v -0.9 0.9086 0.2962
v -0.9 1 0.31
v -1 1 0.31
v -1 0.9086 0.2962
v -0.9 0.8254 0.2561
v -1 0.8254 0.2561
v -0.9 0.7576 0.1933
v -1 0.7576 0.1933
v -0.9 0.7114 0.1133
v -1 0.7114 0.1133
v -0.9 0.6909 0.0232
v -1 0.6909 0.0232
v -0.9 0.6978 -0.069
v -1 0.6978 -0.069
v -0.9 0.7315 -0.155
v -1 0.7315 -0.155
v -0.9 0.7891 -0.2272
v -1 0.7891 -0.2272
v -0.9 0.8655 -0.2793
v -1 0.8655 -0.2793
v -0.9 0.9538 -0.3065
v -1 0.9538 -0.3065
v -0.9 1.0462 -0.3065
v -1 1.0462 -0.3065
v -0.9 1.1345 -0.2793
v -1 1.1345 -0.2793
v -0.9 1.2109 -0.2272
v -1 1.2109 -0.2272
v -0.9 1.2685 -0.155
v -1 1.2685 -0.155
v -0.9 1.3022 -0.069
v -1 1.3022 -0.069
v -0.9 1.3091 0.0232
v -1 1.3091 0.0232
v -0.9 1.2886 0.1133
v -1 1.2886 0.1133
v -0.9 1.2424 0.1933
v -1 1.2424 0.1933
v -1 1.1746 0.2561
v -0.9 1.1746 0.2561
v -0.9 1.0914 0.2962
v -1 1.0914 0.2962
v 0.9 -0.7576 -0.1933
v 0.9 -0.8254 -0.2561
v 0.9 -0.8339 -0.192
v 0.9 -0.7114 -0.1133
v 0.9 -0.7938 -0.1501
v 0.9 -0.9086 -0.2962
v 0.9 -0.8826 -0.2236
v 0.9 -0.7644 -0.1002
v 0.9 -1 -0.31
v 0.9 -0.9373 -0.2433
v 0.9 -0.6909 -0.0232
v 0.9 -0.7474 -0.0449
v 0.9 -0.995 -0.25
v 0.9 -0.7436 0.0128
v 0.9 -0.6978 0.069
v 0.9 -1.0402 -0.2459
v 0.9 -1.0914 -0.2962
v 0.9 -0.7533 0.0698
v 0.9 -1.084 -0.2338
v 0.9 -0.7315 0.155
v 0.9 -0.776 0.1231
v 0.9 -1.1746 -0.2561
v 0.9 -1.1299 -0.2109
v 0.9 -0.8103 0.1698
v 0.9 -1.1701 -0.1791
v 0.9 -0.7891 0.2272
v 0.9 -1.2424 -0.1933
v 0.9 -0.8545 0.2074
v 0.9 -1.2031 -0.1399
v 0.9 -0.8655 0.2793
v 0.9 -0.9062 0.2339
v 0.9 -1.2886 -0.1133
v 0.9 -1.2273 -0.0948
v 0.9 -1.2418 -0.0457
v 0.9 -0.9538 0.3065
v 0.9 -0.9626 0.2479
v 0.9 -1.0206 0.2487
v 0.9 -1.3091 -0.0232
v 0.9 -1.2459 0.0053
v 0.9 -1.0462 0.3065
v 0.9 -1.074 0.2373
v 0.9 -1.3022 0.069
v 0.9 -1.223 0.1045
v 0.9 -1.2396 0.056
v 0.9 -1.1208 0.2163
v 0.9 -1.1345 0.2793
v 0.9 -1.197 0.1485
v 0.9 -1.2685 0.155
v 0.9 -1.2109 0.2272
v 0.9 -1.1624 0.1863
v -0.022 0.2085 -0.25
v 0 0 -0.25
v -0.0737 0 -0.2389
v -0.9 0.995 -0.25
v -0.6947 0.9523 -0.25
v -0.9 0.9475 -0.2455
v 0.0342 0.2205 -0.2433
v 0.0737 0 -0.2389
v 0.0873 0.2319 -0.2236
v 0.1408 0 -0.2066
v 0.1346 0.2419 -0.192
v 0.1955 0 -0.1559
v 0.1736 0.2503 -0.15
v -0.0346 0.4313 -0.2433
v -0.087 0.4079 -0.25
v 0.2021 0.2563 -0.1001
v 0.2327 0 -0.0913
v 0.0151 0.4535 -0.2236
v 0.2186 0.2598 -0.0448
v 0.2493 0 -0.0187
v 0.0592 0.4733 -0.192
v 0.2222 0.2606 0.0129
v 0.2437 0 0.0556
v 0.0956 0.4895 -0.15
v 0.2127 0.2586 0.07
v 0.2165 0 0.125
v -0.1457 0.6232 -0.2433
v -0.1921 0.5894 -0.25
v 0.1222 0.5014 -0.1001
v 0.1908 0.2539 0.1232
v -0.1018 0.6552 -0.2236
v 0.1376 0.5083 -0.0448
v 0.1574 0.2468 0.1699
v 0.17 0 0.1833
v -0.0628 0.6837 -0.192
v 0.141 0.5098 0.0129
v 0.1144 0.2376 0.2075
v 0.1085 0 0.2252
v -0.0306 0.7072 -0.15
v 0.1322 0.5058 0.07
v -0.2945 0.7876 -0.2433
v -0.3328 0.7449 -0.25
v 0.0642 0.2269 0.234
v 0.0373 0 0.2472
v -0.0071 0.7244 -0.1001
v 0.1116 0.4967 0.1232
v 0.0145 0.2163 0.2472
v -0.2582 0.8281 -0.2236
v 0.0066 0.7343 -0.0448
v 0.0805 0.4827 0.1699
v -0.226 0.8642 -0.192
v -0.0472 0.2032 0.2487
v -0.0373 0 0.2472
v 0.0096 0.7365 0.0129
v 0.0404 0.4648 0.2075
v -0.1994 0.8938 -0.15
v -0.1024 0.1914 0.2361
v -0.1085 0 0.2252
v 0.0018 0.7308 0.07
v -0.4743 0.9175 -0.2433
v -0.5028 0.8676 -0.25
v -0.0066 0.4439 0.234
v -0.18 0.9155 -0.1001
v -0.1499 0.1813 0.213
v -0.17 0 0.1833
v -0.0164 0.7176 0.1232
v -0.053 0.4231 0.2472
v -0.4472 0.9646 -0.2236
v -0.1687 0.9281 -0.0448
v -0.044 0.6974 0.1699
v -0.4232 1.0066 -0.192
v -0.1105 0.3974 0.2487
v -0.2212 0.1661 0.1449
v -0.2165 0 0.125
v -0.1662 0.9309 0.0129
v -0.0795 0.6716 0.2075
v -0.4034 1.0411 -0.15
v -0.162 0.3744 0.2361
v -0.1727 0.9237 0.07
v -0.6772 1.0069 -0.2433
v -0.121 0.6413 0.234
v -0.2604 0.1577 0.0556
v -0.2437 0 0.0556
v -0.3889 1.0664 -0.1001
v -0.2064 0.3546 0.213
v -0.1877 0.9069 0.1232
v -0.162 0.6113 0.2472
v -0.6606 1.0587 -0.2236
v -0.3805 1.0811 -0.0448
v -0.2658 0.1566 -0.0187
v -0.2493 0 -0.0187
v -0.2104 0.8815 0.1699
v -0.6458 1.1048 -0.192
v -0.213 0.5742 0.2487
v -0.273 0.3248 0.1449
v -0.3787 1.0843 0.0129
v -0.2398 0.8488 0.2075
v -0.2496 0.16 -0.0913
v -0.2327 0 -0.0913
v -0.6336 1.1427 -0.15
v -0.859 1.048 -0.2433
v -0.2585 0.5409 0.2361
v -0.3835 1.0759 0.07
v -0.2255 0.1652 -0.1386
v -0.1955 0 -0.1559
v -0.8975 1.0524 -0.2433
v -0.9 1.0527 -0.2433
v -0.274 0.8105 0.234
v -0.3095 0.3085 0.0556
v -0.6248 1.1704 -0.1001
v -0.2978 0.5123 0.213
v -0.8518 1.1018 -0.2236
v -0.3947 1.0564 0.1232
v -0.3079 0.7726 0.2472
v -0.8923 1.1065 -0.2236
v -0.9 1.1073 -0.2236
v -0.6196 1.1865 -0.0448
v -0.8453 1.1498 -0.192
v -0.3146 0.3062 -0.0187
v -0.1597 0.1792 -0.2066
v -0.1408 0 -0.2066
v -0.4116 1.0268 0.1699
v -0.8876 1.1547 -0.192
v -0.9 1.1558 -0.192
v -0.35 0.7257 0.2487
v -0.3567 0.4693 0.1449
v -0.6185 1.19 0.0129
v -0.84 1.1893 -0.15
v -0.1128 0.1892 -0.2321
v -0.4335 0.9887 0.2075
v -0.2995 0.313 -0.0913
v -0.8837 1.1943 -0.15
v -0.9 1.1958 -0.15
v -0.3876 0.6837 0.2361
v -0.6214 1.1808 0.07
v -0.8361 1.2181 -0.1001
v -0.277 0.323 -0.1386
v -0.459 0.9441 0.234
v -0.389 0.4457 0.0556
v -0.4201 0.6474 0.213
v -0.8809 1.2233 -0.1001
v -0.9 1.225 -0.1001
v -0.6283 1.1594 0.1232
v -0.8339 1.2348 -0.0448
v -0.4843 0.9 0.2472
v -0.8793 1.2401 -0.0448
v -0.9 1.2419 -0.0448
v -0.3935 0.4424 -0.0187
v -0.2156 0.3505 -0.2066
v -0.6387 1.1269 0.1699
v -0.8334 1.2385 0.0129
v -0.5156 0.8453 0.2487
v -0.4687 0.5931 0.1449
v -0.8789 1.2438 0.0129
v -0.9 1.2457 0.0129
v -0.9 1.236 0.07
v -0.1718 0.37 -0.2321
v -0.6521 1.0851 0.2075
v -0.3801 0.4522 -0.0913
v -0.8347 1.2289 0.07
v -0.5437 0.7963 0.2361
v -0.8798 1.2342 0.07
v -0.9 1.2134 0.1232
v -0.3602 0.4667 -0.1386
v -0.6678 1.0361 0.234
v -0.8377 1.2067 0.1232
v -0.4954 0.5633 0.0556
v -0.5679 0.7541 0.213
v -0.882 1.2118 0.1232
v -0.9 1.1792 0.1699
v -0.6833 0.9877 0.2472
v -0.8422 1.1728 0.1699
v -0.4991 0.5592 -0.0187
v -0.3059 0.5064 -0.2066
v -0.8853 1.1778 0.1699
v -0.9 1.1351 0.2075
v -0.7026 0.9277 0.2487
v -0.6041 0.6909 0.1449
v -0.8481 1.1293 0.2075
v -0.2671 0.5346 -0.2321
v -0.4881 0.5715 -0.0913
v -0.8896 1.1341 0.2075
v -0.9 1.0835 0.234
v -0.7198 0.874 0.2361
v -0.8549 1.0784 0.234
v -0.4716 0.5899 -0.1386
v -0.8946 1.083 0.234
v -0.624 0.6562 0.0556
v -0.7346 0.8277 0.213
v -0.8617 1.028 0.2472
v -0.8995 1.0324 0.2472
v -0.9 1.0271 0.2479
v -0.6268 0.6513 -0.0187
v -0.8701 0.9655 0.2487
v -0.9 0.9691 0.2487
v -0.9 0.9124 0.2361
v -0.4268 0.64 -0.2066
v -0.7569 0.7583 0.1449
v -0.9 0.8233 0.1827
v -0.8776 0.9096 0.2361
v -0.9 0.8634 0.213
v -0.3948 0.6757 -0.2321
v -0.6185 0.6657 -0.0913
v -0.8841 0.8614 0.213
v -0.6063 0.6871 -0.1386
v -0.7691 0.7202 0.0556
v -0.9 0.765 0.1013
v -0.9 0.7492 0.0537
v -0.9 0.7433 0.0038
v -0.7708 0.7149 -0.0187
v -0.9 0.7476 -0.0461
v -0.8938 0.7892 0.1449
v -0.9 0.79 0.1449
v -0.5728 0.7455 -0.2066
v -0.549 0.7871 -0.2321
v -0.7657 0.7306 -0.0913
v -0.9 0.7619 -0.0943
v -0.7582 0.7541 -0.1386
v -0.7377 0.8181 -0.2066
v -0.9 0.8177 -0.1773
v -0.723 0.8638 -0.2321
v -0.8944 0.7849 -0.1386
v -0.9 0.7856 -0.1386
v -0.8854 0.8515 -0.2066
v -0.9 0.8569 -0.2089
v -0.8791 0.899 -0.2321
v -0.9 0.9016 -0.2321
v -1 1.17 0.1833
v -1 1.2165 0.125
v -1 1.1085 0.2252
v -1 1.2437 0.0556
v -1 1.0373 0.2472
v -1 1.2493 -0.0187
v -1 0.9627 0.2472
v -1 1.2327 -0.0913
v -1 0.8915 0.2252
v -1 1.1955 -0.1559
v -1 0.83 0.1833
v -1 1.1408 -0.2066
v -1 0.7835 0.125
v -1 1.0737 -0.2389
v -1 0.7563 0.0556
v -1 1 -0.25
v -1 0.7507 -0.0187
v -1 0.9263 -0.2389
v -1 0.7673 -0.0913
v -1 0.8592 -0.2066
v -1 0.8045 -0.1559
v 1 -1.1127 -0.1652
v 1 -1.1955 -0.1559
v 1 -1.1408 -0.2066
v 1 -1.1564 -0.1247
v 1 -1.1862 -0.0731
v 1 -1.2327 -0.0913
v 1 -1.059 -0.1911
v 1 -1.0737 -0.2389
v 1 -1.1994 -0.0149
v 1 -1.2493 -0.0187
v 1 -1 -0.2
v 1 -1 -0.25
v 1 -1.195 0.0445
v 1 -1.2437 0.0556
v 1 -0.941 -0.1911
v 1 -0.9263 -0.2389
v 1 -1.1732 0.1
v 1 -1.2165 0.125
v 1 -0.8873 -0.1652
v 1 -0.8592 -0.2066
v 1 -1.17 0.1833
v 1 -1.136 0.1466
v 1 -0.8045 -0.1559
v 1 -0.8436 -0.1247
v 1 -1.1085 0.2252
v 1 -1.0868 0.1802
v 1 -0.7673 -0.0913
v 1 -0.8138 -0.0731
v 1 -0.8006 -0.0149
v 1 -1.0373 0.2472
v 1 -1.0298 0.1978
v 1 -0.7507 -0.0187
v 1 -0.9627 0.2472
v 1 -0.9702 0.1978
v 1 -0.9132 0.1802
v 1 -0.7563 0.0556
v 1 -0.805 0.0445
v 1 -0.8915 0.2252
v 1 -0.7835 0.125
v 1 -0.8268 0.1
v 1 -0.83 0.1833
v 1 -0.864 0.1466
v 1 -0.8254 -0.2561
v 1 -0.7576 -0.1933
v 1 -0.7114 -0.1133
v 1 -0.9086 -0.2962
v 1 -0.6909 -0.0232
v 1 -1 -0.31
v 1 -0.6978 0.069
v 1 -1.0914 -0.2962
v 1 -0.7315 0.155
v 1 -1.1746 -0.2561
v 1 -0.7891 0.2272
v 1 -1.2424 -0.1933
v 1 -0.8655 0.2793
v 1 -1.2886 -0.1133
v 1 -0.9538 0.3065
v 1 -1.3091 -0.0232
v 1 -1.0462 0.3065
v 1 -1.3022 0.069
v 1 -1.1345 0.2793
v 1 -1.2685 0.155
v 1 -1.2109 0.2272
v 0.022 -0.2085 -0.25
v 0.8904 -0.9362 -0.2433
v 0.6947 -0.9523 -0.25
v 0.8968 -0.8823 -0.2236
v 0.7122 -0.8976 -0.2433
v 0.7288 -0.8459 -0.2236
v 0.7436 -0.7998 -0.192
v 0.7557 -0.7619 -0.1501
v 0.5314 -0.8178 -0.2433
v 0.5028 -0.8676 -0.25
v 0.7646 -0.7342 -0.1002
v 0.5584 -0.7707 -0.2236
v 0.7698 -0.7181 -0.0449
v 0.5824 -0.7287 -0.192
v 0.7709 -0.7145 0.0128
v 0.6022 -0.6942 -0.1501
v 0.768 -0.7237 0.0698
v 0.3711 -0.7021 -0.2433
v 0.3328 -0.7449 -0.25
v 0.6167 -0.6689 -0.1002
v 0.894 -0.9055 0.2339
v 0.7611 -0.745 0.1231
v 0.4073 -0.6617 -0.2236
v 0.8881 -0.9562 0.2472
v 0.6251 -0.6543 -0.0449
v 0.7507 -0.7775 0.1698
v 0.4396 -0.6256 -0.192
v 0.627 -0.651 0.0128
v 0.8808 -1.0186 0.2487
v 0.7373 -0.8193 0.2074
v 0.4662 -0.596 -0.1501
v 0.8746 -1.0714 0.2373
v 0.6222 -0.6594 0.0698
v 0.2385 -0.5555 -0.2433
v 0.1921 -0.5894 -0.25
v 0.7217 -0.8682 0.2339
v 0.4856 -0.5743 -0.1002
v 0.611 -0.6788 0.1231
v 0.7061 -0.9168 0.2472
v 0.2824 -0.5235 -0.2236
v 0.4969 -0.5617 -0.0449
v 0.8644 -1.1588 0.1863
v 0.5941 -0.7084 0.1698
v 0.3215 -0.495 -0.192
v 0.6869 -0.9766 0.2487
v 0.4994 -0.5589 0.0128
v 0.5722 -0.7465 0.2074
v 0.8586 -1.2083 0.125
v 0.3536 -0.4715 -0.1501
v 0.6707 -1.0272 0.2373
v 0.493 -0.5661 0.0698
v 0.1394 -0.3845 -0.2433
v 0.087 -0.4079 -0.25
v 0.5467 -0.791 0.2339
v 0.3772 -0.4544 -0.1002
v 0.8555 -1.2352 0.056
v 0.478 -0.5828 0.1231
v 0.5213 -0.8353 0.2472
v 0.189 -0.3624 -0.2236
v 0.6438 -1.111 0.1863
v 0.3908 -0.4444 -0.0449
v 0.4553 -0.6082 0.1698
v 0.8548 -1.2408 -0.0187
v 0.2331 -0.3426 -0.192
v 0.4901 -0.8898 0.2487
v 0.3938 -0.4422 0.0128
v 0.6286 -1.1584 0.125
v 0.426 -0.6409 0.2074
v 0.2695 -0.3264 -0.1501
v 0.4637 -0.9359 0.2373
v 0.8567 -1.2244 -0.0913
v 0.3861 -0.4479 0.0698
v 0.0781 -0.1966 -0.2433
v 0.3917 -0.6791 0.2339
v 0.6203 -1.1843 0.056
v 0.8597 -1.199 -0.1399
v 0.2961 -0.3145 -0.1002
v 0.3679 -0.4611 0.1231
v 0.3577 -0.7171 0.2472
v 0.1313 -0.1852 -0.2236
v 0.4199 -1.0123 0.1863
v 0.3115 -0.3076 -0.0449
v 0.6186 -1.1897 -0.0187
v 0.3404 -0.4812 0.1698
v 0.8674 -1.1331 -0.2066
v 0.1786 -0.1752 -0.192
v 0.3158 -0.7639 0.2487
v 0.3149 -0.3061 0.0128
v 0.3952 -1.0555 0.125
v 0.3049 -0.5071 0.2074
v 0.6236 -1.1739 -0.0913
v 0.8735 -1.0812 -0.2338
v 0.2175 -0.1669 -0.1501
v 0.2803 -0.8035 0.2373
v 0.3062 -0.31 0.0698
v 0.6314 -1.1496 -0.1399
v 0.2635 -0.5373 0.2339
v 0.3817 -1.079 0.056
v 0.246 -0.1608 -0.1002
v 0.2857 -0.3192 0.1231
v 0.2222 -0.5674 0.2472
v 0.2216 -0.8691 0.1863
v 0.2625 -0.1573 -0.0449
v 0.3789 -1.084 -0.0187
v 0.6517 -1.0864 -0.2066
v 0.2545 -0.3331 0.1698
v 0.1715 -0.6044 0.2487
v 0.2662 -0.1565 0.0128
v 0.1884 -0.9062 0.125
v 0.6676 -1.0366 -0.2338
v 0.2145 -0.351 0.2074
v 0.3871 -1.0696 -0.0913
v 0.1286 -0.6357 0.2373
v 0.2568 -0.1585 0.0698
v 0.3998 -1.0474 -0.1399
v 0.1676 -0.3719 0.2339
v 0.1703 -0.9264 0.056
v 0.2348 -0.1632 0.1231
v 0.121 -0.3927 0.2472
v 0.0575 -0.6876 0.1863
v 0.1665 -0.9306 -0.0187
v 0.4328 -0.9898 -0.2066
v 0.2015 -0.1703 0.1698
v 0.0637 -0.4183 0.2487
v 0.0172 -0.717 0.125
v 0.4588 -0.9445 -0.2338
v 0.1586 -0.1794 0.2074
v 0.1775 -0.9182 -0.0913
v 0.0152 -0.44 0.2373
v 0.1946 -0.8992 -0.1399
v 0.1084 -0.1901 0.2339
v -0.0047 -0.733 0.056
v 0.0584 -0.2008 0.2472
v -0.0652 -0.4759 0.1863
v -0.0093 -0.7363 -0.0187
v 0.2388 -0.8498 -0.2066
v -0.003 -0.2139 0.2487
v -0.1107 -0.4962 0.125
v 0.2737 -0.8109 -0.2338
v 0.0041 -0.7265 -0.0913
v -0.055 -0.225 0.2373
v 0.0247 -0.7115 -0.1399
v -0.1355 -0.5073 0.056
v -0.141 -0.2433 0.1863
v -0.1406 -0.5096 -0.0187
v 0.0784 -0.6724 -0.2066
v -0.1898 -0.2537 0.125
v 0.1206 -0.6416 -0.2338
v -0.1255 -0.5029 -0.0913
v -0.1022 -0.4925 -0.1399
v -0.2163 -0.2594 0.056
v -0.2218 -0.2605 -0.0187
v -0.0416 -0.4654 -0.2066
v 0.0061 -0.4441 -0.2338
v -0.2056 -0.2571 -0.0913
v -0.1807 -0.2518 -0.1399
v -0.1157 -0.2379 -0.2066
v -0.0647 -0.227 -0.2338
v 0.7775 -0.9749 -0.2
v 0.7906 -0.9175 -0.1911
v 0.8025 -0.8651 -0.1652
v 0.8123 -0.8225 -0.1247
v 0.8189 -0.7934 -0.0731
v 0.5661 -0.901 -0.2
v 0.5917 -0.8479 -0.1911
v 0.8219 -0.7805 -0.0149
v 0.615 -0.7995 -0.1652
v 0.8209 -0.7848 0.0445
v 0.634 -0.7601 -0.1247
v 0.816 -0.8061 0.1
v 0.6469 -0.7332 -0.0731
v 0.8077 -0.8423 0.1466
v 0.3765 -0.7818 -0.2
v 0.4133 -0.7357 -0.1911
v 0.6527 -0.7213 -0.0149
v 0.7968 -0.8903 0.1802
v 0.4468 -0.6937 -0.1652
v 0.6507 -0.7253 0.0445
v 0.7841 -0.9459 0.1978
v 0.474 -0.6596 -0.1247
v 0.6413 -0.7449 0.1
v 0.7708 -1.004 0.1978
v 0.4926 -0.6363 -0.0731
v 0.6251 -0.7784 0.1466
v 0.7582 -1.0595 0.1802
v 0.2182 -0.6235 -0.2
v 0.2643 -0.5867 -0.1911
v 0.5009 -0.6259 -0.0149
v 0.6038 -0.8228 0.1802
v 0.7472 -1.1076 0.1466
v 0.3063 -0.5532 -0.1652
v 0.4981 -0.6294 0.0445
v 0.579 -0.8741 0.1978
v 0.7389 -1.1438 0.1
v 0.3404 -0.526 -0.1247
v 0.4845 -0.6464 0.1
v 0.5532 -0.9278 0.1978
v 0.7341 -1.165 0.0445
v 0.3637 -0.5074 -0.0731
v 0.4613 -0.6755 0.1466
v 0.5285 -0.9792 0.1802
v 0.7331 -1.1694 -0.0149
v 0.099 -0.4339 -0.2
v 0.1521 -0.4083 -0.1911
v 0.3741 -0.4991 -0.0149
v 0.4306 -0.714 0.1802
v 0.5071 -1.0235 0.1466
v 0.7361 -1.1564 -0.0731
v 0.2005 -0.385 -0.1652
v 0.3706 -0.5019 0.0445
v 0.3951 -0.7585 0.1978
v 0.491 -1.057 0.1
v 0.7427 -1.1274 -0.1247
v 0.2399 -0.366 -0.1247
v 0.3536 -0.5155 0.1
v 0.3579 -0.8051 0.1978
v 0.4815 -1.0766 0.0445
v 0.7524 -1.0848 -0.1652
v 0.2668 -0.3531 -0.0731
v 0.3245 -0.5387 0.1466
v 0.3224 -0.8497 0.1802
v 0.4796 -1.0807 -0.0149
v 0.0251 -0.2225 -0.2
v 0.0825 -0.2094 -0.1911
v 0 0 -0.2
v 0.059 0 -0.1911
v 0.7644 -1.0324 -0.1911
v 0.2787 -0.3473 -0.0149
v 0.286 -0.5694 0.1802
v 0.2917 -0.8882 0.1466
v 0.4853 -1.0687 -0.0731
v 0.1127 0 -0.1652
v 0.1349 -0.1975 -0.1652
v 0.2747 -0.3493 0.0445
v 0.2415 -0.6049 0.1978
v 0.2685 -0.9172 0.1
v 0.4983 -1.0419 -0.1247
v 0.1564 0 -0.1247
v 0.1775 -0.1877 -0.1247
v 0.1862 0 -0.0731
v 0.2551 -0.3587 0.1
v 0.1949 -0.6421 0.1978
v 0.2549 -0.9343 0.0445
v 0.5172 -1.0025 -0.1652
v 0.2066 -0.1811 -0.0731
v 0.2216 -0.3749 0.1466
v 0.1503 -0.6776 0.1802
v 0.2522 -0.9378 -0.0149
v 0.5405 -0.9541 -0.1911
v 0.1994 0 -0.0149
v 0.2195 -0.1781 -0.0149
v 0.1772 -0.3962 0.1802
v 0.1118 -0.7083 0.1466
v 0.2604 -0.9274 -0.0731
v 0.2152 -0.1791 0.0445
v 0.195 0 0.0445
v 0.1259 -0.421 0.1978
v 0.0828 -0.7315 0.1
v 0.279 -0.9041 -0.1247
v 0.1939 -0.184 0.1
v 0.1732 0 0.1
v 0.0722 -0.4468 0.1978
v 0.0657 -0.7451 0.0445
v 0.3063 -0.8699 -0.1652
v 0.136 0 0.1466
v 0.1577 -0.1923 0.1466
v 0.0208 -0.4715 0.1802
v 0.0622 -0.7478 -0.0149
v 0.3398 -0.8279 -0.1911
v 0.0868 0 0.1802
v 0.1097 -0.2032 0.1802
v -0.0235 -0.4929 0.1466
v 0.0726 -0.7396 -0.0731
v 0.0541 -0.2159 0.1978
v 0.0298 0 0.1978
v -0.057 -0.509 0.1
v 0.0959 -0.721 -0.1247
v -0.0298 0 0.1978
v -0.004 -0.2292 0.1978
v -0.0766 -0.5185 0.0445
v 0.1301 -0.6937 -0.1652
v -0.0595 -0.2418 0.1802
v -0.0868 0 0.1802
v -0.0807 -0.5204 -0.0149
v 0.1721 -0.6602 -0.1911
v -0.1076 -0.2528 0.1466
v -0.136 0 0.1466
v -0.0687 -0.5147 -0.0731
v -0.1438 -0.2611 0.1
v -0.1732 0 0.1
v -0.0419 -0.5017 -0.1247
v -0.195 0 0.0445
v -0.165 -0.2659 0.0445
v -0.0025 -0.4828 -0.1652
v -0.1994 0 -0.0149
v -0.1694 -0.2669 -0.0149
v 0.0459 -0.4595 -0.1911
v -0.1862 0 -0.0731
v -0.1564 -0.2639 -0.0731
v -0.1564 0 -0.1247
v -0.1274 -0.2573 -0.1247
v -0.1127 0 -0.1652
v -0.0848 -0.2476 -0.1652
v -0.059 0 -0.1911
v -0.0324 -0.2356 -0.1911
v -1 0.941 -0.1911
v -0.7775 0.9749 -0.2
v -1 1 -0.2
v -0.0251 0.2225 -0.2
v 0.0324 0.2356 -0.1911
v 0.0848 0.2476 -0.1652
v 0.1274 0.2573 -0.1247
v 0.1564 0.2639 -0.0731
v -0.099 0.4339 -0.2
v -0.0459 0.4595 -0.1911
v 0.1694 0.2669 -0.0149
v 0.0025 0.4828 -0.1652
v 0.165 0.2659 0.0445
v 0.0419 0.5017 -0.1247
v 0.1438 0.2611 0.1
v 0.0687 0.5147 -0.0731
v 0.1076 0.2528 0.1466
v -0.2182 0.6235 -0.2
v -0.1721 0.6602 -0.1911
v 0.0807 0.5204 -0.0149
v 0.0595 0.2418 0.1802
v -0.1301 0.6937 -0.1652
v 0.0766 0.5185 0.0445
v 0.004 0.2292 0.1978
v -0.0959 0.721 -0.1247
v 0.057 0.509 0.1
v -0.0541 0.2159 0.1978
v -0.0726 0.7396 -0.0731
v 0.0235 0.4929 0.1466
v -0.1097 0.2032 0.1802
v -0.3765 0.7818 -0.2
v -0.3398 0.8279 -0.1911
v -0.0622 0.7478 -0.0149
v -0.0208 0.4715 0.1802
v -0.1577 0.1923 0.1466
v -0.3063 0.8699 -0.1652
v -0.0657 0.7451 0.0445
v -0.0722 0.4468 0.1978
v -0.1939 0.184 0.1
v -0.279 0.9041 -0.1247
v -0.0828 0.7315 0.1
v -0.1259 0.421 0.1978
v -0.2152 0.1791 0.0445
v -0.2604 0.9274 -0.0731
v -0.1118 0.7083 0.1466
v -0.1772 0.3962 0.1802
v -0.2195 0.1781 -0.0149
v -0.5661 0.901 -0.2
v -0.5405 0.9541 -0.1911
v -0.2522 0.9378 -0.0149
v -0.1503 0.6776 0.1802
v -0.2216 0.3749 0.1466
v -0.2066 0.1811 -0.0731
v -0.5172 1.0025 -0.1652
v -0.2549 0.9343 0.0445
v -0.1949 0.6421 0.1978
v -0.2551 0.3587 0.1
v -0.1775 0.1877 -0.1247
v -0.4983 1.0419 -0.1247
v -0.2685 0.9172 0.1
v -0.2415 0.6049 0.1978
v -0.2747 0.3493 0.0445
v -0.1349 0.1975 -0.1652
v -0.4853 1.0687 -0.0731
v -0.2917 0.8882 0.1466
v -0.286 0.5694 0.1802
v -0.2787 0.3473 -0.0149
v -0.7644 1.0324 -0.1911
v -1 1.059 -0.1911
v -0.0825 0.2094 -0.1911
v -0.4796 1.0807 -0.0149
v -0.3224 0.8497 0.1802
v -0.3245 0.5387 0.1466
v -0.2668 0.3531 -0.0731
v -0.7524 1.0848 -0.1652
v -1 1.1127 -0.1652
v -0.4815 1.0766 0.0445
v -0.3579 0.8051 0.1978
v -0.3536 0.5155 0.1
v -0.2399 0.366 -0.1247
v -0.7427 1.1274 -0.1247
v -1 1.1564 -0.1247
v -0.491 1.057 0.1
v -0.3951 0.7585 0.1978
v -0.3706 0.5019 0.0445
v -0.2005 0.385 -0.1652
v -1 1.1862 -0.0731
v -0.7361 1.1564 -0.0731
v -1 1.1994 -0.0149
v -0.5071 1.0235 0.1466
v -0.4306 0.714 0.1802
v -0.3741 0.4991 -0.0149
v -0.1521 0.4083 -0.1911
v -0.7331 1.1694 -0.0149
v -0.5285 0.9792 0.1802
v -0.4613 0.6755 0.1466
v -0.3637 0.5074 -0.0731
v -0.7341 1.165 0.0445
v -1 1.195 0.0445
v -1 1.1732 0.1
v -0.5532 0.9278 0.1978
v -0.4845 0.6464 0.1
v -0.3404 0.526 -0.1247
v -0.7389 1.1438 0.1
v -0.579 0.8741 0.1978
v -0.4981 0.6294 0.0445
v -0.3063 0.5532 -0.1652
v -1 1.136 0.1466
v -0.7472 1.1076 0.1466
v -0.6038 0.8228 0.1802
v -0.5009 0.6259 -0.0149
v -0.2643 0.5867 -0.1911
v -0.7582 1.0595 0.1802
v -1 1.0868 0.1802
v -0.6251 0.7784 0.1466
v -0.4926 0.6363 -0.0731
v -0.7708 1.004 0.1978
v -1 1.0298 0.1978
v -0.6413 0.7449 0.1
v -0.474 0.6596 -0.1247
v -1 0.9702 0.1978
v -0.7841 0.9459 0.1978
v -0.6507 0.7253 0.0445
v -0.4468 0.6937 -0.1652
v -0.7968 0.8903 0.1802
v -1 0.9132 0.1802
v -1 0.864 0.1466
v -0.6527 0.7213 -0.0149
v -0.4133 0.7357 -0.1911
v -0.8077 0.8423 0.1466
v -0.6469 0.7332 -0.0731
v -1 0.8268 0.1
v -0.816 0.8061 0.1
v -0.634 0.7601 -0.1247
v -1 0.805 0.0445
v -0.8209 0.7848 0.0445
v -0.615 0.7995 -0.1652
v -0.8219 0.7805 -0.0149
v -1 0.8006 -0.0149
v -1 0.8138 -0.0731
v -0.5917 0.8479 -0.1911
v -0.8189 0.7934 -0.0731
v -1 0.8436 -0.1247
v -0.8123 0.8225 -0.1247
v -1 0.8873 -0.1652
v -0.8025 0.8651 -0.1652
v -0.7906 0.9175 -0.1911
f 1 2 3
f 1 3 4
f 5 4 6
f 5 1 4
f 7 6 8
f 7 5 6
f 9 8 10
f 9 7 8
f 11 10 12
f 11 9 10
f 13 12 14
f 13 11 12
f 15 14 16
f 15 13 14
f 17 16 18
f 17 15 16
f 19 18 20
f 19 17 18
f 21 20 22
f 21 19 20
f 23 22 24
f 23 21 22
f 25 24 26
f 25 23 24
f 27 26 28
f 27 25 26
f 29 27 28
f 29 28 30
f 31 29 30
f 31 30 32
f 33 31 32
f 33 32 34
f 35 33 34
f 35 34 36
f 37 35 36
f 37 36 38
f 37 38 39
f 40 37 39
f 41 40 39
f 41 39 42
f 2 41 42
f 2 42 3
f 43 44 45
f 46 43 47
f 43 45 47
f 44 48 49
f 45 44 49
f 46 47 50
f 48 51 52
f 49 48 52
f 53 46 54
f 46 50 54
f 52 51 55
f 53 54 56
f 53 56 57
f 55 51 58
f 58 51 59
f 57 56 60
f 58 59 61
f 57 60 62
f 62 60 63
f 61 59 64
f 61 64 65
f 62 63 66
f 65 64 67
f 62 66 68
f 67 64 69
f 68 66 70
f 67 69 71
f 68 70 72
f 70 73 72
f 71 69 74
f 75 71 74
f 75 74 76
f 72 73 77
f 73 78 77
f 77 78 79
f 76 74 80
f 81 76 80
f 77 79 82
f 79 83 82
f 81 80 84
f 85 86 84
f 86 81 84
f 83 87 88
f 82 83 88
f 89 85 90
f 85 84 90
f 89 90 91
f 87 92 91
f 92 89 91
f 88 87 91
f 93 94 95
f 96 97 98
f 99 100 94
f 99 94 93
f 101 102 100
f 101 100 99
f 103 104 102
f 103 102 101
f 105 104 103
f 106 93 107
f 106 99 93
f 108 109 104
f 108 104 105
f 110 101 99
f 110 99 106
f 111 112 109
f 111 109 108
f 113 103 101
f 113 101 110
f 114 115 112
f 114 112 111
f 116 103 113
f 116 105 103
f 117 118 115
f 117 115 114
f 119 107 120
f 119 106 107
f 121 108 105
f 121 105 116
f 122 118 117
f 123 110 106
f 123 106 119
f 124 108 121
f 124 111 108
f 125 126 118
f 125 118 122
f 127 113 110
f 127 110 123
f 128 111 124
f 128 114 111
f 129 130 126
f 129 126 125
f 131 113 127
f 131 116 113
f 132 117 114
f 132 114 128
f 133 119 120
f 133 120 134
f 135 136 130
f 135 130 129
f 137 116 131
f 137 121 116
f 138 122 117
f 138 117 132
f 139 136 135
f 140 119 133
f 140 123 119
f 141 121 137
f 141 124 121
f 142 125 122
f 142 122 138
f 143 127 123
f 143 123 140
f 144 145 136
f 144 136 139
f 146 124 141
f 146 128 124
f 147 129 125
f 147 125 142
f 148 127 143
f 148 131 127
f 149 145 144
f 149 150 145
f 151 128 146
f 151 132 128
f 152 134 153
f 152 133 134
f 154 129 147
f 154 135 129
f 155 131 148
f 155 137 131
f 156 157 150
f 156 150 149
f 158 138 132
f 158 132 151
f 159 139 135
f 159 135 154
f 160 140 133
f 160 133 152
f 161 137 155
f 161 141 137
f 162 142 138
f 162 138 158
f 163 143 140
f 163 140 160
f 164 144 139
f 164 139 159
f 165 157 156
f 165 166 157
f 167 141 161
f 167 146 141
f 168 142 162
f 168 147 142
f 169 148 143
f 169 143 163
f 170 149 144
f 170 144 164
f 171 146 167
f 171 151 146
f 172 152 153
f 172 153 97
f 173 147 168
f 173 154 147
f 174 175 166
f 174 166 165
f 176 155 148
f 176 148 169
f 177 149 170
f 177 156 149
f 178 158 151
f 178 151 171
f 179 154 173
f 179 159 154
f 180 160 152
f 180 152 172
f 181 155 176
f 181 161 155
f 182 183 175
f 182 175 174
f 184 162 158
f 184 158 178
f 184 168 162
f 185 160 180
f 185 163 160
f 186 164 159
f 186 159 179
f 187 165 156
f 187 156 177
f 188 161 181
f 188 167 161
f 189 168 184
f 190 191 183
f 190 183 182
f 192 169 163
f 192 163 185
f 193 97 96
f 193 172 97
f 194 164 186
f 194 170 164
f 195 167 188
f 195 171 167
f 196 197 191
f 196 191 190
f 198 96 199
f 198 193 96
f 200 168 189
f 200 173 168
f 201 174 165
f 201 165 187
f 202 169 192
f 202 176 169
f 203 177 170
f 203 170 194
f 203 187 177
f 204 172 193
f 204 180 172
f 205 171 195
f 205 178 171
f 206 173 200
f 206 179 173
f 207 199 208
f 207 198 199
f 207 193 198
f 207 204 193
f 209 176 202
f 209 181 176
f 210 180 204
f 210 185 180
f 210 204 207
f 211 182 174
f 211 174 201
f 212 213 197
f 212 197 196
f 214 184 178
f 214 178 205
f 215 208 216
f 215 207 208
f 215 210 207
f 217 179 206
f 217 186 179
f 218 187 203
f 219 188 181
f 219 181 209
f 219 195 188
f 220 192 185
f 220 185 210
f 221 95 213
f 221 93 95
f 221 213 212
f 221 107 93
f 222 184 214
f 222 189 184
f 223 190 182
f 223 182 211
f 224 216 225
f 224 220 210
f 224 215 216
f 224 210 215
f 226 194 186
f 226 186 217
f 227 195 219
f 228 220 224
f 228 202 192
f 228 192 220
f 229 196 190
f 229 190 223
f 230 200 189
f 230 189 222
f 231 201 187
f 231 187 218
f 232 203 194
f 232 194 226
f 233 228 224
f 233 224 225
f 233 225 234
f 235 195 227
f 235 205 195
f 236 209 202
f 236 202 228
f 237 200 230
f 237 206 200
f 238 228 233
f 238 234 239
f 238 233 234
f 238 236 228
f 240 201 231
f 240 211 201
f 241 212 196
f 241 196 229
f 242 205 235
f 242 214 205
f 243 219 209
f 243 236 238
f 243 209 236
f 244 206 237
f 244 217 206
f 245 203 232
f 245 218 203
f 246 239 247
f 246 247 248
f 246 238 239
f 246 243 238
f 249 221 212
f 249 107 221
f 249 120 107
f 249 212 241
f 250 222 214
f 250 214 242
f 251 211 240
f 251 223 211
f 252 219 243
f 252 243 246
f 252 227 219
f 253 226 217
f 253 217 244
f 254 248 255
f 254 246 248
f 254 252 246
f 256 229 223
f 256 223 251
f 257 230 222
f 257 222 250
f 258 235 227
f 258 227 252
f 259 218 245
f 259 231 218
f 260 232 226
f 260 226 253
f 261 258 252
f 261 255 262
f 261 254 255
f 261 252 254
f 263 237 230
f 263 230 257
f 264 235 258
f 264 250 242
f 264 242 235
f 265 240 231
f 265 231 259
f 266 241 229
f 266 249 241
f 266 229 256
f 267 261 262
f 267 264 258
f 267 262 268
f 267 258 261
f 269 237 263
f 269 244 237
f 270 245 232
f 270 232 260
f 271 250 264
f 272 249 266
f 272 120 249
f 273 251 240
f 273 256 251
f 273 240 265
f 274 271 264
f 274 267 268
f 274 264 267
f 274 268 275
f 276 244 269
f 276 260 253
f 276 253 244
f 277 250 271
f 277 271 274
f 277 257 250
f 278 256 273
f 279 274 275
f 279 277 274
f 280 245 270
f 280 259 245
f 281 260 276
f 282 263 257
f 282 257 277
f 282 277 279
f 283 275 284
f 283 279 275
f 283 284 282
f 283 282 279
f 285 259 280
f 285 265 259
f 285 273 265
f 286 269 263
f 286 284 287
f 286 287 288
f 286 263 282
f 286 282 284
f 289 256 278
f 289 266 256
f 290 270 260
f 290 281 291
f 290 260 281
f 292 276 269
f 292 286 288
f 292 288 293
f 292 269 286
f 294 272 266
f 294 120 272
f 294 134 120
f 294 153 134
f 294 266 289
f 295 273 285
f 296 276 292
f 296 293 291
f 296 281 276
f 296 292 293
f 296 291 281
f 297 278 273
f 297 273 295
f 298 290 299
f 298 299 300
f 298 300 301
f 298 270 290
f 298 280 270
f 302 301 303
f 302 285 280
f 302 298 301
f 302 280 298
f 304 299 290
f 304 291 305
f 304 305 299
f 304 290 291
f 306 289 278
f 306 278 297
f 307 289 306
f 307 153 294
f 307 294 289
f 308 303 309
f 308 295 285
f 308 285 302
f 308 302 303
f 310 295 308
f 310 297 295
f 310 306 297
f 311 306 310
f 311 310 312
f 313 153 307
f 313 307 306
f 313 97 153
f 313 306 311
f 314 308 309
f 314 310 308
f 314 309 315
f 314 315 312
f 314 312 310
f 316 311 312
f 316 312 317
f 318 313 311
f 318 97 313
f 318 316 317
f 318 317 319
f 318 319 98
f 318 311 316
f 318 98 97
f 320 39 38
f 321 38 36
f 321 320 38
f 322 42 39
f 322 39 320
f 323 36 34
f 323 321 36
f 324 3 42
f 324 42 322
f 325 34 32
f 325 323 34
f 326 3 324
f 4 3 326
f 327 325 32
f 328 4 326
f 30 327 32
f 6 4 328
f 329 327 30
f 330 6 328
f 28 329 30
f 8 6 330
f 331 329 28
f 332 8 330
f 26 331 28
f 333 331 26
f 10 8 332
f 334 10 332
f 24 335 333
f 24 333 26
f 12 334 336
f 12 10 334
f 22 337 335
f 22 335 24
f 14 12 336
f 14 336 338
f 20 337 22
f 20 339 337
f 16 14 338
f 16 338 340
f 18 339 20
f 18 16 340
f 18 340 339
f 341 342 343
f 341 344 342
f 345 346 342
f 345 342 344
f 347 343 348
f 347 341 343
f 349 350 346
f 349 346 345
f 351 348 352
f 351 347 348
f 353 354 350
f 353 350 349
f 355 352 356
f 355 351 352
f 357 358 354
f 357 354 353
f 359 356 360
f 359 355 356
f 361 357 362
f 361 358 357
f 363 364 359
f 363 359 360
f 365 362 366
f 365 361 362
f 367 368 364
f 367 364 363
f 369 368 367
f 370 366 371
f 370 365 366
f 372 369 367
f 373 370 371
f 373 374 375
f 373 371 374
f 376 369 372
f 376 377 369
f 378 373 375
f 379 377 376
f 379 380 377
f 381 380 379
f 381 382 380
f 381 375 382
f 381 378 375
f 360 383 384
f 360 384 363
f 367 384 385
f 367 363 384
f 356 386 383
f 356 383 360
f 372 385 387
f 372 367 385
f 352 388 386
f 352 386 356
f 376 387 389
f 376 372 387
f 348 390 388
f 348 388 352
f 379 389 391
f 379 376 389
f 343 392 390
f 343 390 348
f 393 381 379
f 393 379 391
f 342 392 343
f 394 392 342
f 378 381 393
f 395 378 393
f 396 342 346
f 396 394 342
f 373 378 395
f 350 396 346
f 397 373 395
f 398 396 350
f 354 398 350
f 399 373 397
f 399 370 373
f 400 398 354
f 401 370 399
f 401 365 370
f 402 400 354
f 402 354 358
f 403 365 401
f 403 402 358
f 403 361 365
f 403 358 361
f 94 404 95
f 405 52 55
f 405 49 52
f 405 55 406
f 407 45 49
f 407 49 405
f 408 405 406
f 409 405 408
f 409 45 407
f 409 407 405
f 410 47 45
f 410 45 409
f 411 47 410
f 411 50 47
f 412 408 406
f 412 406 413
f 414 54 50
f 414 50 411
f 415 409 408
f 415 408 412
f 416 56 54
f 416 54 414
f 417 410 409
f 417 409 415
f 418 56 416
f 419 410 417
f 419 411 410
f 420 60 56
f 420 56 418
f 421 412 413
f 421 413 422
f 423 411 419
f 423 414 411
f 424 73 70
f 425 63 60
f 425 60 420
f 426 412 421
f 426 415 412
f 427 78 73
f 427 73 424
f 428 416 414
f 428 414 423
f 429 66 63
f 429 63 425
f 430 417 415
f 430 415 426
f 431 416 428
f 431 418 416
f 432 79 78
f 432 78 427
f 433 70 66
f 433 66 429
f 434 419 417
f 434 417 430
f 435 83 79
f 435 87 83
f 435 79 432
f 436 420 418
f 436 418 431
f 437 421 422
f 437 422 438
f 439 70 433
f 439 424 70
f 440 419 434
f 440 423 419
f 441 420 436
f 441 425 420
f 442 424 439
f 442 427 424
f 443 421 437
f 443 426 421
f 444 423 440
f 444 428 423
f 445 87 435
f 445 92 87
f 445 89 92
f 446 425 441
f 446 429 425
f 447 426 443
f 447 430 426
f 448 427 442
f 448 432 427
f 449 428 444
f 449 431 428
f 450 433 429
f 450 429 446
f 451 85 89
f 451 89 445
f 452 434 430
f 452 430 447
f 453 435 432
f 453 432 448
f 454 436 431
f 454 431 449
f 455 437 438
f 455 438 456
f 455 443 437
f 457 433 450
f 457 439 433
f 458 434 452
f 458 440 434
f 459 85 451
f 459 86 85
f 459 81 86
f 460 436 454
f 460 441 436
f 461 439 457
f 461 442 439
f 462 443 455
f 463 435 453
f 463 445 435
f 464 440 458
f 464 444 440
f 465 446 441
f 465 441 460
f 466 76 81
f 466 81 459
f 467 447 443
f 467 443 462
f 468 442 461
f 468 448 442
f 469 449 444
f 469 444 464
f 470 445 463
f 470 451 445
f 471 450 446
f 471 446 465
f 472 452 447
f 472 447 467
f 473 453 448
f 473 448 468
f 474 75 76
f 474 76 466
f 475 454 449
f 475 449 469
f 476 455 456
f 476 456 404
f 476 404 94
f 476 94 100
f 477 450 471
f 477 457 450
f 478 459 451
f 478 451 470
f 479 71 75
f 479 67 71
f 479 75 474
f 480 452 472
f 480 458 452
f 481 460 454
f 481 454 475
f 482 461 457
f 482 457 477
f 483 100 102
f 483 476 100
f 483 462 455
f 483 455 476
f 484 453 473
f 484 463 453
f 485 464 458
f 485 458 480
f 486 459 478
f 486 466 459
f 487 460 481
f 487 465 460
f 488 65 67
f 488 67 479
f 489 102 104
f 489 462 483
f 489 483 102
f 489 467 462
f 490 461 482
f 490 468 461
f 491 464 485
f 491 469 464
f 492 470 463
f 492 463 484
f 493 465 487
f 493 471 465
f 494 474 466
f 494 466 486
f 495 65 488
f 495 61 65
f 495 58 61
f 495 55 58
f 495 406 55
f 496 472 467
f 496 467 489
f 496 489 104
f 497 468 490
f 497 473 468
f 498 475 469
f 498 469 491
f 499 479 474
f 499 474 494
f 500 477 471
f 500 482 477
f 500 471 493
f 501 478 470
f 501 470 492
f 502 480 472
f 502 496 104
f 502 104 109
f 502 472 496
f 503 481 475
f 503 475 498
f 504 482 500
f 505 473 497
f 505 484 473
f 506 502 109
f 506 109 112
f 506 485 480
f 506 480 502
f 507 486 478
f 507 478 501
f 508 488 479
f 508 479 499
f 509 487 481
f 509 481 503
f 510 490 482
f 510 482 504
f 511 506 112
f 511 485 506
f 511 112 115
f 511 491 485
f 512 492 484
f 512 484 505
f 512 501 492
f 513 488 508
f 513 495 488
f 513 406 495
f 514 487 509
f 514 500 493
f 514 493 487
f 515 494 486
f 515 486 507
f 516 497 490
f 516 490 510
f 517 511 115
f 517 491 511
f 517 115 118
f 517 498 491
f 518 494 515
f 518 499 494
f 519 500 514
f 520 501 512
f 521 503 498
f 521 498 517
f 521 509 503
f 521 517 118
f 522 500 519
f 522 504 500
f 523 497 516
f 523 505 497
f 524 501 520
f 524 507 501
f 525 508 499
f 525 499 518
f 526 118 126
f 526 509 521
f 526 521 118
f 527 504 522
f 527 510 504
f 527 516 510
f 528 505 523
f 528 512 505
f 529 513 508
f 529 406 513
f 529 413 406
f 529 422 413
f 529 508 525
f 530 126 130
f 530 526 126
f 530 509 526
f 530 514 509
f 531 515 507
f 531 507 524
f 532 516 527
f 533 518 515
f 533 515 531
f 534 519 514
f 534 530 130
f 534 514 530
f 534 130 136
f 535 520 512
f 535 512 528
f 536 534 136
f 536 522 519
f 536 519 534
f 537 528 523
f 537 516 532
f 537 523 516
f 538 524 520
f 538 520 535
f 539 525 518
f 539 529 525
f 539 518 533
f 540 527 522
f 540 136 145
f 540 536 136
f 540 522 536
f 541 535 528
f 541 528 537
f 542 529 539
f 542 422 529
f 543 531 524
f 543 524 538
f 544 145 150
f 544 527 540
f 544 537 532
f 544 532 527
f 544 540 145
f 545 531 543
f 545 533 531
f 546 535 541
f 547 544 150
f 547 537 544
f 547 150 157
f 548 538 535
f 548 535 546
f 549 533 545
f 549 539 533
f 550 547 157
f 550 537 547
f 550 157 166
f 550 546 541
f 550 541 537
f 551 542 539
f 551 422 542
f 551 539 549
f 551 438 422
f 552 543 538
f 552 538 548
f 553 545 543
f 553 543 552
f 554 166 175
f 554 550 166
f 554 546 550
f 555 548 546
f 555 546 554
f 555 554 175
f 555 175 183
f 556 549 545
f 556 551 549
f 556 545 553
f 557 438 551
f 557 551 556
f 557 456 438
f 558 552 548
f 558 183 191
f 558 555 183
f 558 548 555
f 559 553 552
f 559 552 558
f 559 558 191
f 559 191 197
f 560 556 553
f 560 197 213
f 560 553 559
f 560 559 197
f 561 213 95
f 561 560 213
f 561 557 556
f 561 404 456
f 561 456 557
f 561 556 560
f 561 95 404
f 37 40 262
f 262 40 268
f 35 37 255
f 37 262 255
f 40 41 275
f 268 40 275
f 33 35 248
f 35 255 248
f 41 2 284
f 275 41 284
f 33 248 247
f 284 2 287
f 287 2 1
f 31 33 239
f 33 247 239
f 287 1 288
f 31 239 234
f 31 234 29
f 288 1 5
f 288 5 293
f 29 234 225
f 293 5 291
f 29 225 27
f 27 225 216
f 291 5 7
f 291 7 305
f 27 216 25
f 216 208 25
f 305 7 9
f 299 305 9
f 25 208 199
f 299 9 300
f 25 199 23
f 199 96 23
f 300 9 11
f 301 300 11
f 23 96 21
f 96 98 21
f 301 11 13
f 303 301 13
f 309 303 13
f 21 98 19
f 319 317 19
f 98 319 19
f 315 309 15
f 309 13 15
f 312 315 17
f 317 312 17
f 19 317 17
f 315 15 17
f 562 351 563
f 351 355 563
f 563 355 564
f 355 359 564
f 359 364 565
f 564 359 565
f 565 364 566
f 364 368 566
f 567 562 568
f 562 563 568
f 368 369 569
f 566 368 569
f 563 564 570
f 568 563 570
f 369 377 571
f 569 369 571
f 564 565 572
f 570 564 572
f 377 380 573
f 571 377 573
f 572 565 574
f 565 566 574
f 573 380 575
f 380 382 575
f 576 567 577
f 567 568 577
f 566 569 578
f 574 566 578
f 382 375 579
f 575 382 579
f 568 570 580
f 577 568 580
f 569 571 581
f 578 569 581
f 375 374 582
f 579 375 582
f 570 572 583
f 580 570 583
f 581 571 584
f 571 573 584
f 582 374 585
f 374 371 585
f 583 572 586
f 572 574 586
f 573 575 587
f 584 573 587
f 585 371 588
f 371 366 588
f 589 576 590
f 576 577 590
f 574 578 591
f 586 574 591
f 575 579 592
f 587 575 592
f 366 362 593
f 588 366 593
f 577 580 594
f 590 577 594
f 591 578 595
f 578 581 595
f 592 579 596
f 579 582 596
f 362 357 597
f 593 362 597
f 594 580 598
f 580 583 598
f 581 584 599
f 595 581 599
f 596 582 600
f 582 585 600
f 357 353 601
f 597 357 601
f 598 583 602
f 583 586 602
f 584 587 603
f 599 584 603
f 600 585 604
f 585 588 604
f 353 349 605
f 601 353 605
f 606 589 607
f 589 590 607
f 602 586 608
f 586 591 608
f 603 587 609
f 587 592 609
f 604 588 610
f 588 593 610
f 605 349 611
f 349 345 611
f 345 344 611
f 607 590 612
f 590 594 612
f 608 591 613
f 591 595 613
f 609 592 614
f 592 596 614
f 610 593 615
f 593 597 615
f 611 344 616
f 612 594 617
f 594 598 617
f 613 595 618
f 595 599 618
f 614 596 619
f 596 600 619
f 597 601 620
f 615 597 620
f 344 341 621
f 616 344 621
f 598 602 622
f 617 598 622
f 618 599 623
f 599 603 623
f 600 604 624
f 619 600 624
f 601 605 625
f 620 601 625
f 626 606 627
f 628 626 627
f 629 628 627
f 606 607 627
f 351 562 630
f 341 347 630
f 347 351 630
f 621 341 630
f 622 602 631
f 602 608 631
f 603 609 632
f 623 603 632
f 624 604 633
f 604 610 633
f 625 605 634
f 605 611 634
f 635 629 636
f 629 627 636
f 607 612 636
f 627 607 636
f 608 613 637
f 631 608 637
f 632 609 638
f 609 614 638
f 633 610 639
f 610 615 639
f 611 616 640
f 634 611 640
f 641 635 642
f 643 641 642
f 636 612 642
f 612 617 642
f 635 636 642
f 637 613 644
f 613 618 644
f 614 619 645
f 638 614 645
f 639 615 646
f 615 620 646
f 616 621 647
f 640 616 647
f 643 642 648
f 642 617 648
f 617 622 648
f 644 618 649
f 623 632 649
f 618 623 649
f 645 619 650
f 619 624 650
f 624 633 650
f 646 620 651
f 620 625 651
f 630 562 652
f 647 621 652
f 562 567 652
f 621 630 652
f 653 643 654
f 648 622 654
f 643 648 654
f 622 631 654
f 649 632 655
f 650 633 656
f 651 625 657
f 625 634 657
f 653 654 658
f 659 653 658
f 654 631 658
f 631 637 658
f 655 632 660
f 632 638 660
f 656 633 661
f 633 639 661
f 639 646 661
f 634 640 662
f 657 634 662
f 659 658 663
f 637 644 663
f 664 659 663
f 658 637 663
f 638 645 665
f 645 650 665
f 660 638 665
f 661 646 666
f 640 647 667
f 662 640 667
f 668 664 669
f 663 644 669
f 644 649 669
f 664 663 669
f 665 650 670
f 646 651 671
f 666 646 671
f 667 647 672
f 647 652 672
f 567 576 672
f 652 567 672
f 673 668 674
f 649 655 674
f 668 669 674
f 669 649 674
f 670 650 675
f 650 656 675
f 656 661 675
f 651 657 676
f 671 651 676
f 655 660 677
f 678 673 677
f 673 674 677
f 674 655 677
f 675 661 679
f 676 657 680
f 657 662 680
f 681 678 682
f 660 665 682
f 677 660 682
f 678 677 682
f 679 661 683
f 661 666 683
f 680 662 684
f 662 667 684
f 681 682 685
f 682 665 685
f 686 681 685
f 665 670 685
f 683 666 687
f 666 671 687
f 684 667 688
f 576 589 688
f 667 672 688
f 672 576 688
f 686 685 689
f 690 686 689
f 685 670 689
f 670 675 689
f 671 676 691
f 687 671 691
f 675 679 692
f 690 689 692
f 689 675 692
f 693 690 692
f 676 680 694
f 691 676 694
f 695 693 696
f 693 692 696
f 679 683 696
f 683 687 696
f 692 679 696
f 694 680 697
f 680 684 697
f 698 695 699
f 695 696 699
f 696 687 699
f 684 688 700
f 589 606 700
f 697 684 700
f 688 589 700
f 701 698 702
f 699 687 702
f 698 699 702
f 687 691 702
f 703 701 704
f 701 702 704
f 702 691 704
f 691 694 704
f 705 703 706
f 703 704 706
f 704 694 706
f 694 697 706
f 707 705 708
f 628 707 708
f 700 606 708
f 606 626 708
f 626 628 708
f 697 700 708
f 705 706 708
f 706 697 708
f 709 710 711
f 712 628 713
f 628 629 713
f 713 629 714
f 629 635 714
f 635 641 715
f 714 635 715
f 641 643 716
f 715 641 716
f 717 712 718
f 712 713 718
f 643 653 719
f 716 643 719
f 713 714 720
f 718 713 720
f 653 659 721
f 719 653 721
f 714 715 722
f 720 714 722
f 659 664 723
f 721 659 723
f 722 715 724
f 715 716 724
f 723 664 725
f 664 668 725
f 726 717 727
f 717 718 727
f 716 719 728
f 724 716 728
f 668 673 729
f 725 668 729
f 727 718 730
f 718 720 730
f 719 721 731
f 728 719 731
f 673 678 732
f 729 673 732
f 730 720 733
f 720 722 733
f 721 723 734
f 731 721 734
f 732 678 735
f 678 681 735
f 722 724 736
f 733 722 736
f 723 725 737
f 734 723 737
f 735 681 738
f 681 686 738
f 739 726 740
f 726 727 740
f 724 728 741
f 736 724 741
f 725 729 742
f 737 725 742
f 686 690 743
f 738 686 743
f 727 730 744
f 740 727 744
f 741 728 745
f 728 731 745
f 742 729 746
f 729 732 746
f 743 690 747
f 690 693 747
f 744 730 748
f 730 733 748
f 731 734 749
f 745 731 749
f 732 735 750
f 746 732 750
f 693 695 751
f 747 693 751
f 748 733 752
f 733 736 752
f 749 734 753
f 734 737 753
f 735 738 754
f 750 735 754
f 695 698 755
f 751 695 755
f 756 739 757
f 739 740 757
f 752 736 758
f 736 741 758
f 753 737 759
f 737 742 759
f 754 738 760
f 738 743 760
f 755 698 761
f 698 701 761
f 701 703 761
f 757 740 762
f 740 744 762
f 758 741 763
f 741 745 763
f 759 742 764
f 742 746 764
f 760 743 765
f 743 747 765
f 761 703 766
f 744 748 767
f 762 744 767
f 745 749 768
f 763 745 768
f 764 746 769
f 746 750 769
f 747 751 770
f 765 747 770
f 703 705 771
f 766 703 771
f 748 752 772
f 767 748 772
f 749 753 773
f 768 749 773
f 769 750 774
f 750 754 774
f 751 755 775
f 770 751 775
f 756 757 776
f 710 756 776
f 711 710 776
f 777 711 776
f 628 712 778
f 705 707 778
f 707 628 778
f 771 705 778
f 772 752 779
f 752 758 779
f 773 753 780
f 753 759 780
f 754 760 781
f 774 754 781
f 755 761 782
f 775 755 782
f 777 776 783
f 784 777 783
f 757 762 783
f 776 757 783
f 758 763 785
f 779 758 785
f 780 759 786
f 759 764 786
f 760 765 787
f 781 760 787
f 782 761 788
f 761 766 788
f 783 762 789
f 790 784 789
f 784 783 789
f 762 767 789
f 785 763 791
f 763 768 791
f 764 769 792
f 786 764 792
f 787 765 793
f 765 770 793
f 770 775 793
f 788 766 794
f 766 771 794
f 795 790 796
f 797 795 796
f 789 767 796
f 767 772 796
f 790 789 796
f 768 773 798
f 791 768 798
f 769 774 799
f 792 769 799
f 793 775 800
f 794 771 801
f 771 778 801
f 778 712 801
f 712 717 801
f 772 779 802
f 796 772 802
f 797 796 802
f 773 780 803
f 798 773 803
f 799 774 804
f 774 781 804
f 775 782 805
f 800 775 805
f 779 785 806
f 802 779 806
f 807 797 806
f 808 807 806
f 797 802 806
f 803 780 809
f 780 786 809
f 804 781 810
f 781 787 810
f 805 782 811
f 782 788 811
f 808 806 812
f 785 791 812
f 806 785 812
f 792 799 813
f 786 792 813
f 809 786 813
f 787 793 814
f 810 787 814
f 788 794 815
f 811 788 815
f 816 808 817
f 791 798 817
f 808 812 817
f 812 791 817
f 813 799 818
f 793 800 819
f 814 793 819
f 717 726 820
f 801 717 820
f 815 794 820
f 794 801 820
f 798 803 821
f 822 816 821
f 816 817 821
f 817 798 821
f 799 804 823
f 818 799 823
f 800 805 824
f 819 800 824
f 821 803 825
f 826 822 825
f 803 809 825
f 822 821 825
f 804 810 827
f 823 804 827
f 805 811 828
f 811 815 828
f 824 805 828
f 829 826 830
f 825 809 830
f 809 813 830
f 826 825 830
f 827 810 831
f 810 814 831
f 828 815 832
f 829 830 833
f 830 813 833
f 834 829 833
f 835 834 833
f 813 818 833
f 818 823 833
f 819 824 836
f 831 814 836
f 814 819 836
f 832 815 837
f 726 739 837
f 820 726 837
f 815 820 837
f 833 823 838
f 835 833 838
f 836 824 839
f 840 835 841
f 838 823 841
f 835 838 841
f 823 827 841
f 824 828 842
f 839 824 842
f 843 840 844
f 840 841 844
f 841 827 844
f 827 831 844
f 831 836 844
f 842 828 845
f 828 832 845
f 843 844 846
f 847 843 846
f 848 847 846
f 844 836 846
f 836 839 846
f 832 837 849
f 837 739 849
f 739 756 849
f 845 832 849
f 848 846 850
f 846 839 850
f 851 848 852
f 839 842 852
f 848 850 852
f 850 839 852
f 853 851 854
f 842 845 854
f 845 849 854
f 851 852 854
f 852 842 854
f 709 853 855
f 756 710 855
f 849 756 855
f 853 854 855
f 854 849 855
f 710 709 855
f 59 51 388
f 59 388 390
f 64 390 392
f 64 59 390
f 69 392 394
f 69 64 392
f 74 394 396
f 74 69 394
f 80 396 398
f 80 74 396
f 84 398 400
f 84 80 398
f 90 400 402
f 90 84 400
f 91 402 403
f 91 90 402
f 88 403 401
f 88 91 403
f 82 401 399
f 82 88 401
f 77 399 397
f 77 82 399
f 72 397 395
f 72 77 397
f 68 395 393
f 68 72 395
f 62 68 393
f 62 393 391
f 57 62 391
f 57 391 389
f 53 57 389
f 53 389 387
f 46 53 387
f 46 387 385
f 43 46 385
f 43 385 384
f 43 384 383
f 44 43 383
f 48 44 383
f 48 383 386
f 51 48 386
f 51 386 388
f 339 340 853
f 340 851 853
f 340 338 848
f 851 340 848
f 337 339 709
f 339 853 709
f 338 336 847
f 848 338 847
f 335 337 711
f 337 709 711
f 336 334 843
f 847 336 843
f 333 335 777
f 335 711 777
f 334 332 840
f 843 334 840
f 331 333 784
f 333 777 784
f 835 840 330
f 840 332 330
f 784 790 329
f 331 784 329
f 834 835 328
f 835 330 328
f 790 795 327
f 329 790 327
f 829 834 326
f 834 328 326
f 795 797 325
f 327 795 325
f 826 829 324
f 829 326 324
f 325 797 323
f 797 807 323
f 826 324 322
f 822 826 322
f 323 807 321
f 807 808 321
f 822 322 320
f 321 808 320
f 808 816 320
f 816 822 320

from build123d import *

# Parameters (mm, degrees)
IZIM3_R   = 0.25
IZIM3_R_2 = 0.2
IZIM8_R   = 0.31
IZIM8_R_2 = 0.21
IZIM9_R   = 0.31
IZIM9_R_2 = 0.21


with BuildPart() as part:
    # Süpür-İnce3: sweep along a path in Çizim1
    with BuildLine(Plane.XY) as s_p_r_nce3_path:
        ThreePointArc((1, -1), (0.292893219, -0.707106781), (0, 0))
        ThreePointArc((0, 0), (-0.292893219, 0.707106781), (-1, 1))
    # Çizim3 → Süpür-İnce3 (sweep)
    with BuildSketch(Plane(origin=(1, 0, 0), x_dir=(0, 0, -1), z_dir=(1, 0, 0))):
        with Locations((0, -1)):
            Circle(IZIM3_R)
        with Locations((0, -1)):
            Circle(IZIM3_R_2, mode=Mode.SUBTRACT)
    sweep(path=s_p_r_nce3_path.line)

    # Süpür-İnce5: sweep along a path in Çizim7
    with BuildLine(Plane.XY) as s_p_r_nce5_path:
        Line((-1, 1), (-0.9, 1))
    # Çizim8 → Süpür-İnce5 (sweep)
    with BuildSketch(Plane.ZY.offset(1)):
        with Locations((0, 1)):
            Circle(IZIM8_R)
        with Locations((0, 1)):
            Circle(IZIM8_R_2, mode=Mode.SUBTRACT)
    sweep(path=s_p_r_nce5_path.line)

    # Süpür-İnce6: sweep along a path in Çizim5
    with BuildLine(Plane.XY) as s_p_r_nce6_path:
        Line((1, -1), (0.9, -1))
    # Çizim9 → Süpür-İnce6 (sweep)
    with BuildSketch(Plane(origin=(1, 0, 0), x_dir=(0, 0, -1), z_dir=(1, 0, 0))):
        with Locations((0, -1)):
            Circle(IZIM9_R)
        with Locations((0, -1)):
            Circle(IZIM9_R_2, mode=Mode.SUBTRACT)
    sweep(path=s_p_r_nce6_path.line)


solid = part.part
